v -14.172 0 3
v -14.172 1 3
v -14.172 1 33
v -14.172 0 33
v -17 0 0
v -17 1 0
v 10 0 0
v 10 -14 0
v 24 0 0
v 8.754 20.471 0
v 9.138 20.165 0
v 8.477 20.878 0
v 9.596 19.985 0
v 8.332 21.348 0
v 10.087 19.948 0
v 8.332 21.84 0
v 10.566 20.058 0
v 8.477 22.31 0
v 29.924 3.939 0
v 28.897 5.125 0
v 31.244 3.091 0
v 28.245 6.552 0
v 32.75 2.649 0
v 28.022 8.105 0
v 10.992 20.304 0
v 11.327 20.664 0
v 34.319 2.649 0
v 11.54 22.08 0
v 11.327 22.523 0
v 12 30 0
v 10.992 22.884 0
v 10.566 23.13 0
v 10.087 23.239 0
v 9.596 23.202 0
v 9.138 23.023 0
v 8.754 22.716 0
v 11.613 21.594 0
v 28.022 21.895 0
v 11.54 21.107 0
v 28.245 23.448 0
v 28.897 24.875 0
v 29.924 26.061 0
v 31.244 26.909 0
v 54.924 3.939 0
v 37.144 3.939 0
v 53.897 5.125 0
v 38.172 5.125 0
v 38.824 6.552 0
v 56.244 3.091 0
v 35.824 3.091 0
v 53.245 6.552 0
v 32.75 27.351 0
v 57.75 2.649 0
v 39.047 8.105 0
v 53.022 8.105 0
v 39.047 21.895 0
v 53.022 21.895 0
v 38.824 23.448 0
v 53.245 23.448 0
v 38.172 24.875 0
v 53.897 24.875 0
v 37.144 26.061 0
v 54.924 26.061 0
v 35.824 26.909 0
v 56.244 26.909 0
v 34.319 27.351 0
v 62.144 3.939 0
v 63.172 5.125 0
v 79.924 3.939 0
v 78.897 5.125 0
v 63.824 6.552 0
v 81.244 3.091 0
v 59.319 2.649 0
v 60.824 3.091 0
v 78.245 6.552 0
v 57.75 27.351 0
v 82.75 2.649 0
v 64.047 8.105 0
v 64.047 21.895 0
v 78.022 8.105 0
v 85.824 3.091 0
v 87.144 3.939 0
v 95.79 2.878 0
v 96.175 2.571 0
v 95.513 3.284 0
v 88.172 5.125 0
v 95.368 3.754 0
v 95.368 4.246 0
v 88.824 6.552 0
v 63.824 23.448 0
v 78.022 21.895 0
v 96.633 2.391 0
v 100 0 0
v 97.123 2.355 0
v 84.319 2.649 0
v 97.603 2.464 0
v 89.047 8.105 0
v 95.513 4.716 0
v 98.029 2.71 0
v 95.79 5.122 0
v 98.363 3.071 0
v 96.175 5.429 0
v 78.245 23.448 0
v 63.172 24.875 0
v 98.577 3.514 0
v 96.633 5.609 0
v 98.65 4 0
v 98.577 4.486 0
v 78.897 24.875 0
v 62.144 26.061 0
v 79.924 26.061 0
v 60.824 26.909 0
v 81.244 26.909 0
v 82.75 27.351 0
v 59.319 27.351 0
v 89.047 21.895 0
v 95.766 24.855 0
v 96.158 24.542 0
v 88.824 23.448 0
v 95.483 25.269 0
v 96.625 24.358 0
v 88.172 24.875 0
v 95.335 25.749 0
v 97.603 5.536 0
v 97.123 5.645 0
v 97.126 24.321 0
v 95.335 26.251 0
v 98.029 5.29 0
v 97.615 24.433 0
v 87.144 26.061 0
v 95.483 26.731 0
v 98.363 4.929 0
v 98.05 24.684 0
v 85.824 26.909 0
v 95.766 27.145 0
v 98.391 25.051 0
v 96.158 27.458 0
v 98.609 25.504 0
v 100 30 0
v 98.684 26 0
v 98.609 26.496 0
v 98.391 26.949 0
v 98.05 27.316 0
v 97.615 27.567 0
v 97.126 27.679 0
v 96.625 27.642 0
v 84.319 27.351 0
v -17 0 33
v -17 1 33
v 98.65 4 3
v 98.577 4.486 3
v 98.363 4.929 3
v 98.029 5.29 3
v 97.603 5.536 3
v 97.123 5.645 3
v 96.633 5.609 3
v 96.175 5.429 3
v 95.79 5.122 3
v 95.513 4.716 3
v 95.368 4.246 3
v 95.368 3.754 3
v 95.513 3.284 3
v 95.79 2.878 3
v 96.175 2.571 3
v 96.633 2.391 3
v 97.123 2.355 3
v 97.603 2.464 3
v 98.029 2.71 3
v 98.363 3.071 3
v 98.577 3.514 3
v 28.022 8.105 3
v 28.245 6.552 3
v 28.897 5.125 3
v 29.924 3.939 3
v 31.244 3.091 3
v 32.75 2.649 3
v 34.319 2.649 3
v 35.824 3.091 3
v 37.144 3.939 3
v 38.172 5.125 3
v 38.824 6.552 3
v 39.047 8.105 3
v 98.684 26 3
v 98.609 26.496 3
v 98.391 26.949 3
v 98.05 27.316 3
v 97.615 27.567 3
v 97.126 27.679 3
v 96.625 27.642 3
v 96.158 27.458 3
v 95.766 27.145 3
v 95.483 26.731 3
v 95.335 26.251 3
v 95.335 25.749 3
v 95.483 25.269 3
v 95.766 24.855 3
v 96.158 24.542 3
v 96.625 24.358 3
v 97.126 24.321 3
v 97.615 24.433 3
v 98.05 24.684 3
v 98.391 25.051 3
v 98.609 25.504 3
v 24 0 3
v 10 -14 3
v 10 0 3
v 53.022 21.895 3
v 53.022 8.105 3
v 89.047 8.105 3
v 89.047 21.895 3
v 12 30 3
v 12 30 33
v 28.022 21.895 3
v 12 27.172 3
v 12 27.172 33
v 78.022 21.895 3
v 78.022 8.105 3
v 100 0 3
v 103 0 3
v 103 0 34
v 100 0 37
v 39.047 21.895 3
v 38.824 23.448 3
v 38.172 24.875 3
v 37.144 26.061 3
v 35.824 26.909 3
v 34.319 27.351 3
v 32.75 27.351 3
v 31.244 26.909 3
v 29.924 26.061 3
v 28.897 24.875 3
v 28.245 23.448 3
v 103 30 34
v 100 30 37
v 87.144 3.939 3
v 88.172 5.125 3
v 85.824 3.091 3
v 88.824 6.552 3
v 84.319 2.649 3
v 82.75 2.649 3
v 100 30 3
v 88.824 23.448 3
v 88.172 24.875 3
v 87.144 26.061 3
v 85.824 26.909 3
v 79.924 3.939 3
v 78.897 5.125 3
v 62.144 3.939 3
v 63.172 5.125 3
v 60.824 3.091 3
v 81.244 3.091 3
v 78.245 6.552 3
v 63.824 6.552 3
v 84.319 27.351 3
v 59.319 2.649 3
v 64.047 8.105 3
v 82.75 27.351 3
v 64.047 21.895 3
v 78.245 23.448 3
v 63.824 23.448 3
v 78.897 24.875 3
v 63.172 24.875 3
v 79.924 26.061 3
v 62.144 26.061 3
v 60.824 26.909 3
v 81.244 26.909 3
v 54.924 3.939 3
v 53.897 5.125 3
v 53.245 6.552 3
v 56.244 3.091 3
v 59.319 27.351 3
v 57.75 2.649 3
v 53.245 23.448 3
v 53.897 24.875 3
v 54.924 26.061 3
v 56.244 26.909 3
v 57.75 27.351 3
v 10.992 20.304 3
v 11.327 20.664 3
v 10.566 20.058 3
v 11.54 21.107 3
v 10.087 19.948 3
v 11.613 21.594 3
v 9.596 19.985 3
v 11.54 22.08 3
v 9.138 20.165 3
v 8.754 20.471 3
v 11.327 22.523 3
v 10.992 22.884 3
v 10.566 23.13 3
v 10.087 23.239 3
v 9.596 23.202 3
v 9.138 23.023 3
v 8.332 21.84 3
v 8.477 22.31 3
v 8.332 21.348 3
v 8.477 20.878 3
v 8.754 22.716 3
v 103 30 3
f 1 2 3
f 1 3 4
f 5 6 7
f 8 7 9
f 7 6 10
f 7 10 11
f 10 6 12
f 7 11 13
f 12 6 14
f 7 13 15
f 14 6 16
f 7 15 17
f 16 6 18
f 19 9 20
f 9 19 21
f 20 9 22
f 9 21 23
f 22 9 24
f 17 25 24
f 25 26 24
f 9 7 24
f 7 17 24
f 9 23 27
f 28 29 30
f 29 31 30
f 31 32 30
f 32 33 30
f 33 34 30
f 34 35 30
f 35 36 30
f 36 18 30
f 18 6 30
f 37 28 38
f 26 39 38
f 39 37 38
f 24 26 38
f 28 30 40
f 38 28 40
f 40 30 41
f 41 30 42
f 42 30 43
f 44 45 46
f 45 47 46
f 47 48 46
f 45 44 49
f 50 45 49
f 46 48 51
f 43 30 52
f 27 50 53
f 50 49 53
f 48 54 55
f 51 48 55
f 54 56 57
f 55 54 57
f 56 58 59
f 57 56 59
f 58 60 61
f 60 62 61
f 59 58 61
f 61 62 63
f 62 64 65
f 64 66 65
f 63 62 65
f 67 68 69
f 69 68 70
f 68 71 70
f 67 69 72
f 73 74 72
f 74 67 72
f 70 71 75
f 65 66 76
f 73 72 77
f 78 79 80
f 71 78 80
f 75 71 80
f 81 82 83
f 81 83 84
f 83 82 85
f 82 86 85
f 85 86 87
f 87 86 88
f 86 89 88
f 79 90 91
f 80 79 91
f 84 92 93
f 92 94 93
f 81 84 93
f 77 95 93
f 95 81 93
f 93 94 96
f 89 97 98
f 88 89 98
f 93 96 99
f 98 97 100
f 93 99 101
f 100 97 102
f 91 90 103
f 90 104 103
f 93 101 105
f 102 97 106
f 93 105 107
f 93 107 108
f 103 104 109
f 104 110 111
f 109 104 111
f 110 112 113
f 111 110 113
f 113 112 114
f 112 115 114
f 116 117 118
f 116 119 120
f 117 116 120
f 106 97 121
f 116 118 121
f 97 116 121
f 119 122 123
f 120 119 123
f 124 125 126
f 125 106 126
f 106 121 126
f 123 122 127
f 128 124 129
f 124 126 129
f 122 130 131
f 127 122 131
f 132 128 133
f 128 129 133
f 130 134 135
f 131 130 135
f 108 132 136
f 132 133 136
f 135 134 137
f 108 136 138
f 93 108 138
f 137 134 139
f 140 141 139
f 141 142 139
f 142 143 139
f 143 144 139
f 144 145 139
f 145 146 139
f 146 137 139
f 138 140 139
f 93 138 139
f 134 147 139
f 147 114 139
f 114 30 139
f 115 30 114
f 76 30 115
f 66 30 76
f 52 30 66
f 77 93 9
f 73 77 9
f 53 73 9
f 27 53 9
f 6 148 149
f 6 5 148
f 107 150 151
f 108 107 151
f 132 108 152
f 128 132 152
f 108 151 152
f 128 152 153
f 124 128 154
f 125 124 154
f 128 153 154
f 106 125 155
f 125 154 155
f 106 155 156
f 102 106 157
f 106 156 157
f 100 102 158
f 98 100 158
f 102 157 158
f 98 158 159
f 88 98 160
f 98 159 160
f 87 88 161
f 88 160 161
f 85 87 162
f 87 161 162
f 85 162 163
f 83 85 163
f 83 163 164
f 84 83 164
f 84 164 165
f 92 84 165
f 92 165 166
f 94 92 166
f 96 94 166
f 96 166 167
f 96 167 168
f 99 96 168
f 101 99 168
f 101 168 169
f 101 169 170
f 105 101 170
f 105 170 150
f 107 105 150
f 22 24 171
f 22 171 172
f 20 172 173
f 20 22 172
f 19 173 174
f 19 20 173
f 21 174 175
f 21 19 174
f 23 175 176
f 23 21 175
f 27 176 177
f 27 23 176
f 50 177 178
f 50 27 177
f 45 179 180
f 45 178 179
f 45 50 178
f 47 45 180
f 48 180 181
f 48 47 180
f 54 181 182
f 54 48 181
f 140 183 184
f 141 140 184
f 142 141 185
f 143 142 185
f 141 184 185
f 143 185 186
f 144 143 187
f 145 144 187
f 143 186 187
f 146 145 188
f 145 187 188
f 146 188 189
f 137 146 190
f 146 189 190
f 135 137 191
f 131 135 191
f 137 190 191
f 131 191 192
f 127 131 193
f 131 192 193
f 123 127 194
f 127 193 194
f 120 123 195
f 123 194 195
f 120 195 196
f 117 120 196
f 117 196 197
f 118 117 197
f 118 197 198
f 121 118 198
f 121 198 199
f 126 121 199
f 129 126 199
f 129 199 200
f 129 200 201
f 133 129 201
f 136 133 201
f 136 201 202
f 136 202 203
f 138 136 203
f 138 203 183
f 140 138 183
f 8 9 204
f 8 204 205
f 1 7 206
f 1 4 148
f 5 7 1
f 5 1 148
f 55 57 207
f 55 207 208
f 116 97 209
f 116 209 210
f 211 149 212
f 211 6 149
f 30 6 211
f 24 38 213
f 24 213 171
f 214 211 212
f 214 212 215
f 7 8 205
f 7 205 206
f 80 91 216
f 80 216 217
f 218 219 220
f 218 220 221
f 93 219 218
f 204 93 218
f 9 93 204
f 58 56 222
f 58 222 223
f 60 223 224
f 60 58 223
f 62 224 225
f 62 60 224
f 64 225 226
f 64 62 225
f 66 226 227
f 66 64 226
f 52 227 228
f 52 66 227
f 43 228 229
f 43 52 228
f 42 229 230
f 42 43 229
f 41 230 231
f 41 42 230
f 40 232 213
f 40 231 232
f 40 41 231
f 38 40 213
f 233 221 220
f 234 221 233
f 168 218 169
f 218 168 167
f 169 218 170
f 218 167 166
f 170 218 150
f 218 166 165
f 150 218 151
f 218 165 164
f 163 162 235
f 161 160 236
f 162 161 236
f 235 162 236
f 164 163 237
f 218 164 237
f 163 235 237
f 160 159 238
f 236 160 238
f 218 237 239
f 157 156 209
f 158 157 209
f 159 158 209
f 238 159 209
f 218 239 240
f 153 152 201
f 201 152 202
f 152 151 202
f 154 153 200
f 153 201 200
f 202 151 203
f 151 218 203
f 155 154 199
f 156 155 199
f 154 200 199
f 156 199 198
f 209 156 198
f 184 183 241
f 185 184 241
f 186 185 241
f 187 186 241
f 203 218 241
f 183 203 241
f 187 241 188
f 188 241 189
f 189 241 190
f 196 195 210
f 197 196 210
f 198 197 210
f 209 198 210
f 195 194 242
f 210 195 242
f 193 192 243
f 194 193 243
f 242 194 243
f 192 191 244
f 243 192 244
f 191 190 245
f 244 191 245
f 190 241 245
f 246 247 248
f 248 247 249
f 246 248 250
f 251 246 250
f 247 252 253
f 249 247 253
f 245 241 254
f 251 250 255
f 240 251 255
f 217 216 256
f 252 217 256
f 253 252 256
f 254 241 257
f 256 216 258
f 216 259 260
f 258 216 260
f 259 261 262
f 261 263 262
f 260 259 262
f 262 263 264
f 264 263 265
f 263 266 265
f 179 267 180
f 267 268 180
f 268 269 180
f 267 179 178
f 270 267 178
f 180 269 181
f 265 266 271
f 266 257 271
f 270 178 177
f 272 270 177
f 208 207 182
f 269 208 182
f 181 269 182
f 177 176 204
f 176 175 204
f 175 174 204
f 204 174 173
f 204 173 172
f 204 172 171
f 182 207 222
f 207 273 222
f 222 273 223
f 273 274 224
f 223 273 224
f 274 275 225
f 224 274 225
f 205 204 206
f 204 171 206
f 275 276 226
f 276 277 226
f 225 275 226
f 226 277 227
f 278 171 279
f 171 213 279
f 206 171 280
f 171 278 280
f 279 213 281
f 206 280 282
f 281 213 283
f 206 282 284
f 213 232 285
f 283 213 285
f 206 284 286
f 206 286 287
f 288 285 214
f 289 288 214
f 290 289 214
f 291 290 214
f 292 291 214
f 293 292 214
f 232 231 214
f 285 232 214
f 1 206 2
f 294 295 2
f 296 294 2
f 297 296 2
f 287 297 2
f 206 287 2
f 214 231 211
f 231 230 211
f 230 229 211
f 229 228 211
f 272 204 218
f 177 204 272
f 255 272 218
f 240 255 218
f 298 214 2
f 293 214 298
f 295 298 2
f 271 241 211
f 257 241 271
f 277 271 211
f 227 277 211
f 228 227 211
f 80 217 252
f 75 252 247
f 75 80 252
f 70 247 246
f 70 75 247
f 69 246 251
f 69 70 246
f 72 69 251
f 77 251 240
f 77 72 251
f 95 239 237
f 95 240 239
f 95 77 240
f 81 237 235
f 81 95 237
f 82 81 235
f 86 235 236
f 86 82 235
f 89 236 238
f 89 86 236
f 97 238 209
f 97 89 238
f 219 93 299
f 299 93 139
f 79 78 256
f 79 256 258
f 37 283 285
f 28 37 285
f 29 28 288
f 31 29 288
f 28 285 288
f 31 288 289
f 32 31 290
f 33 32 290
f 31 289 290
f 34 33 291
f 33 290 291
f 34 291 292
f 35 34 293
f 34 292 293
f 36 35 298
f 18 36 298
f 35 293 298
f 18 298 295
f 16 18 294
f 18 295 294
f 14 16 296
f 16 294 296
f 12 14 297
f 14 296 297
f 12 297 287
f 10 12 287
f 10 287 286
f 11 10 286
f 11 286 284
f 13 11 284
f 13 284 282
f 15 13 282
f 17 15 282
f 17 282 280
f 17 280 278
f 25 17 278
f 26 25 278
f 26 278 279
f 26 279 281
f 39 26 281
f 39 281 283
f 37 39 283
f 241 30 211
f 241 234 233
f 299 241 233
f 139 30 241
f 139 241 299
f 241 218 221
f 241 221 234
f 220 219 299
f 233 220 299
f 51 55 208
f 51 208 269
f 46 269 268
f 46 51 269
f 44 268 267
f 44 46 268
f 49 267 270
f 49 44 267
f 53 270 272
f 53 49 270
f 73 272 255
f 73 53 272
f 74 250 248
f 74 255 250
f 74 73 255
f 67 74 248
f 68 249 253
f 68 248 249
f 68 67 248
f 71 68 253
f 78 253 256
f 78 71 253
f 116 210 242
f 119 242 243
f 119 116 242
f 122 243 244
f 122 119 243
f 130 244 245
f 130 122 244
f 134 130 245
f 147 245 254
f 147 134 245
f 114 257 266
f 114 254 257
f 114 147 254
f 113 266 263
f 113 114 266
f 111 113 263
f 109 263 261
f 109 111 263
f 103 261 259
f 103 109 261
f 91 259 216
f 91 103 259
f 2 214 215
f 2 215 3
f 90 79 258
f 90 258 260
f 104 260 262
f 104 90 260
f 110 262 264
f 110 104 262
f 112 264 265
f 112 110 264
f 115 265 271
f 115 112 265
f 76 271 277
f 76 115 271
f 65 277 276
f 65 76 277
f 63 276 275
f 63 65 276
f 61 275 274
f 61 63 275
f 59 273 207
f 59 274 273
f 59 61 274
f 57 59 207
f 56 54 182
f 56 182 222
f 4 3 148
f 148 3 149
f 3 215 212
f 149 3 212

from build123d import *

# Parameters (mm, degrees)
SKETCH_1_W           = 100
SKETCH_1_H           = 30
EXTRUDE_1_DEPTH      = 3
CUT_EXTRUDE_1_REACH  = 106.446
EXTRUDE_3_DEPTH      = 3
CUT_EXTRUDE_2_REACH  = 106.446
SKETCH_5_R           = 1.65
SKETCH_5_R_2         = 1.683787266
EXTRUDE_4_DEPTH      = 34
EXTRUDE_4_DEPTH_BACK = 3
SKETCH_6_W           = 3
SKETCH_6_H           = 30
EXTRUDE_5_DEPTH      = 30
CHAMFER_1_SIZE       = 3
CHAMFER_2_SIZE       = 3
EXTRUDE_6_DEPTH      = 3
CUT_EXTRUDE_3_DEPTH  = 114.481275989


with BuildPart() as part:
    # 草图1 → 凸台-拉伸1 (new body)
    with BuildSketch(Plane.XY):
        with Locations((50, 15)):
            Rectangle(SKETCH_1_W, SKETCH_1_H)
    extrude(amount=EXTRUDE_1_DEPTH)

    # 草图2 → 切除-拉伸1 (cut, up to next)
    with BuildSketch(Plane.XY.offset(3), mode=Mode.PRIVATE) as cut_extrude_1_sk1:
        Polygon((0, 18), (12, 30), (0, 30), align=None)
    cut_extrude_1_tool1 = extrude(cut_extrude_1_sk1.sketch, amount=-CUT_EXTRUDE_1_REACH, mode=Mode.PRIVATE) & part.part
    add(cut_extrude_1_tool1.solids().sort_by_distance((4, 26, 3))[0], mode=Mode.SUBTRACT)

    # 草图4 → 凸台-拉伸3 (add)
    with BuildSketch(Plane(origin=(0, 0, 0), x_dir=(-1, 0, 0), z_dir=(0, 0, -1))):
        Polygon((0, 0), (17, 0), (17, 1), (0, 18), align=None)
    extrude(amount=-EXTRUDE_3_DEPTH)

    # 草图5 → 切除-拉伸2 (cut, up to next)
    with BuildSketch(Plane.XY.offset(3), mode=Mode.PRIVATE) as cut_extrude_2_sk1:
        with Locations((9.963410089, 21.593670707)):
            Circle(SKETCH_5_R)
    cut_extrude_2_tool1 = extrude(cut_extrude_2_sk1.sketch, amount=-CUT_EXTRUDE_2_REACH, mode=Mode.PRIVATE) & part.part
    # 草图5 → 切除-拉伸2 (cut, up to next)
    with BuildSketch(Plane.XY.offset(3), mode=Mode.PRIVATE) as cut_extrude_2_sk2:
        with Locations((97, 26)):
            Circle(SKETCH_5_R_2)
    cut_extrude_2_tool2 = extrude(cut_extrude_2_sk2.sketch, amount=-CUT_EXTRUDE_2_REACH, mode=Mode.PRIVATE) & part.part
    # 草图5 → 切除-拉伸2 (cut, up to next)
    with BuildSketch(Plane.XY.offset(3), mode=Mode.PRIVATE) as cut_extrude_2_sk3:
        with Locations((97, 4)):
            Circle(SKETCH_5_R)
    cut_extrude_2_tool3 = extrude(cut_extrude_2_sk3.sketch, amount=-CUT_EXTRUDE_2_REACH, mode=Mode.PRIVATE) & part.part
    add(cut_extrude_2_tool1.solids().sort_by_distance((9.96341, 21.593671, 3))[0], mode=Mode.SUBTRACT)
    add(cut_extrude_2_tool2.solids().sort_by_distance((97, 26, 3))[0], mode=Mode.SUBTRACT)
    add(cut_extrude_2_tool3.solids().sort_by_distance((97, 4, 3))[0], mode=Mode.SUBTRACT)

    # 草图6 → 凸台-拉伸4 (add, two sides: drawn at the far end of the back side and taken through both)
    with BuildSketch(Plane.XY.offset(3).offset(-EXTRUDE_4_DEPTH_BACK)):
        with Locations((101.5, 15)):
            Rectangle(SKETCH_6_W, SKETCH_6_H)
    extrude(amount=EXTRUDE_4_DEPTH + EXTRUDE_4_DEPTH_BACK)

    # 草图7 → 凸台-拉伸5 (add)
    with BuildSketch(Plane.XY.offset(3)):
        Polygon((-17, 1), (12, 30), (12, 27.171572875), (-14.171572875, 1), (-14.171572875, 0), (-17, 0), align=None)
    extrude(amount=EXTRUDE_5_DEPTH)

    # 倒角1
    chamfer_1_edges = [part.edges().sort_by_distance(p)[0] for p in [
        (103, 15, 0),
    ]]
    chamfer(chamfer_1_edges, length=CHAMFER_1_SIZE)

    # 倒角2
    chamfer_2_edges = [part.edges().sort_by_distance(p)[0] for p in [
        (103, 15, 37),
    ]]
    chamfer(chamfer_2_edges, length=CHAMFER_2_SIZE - 0.0001)  # a hair under: the kernel refuses the full size

    # 草图3 → 凸台-拉伸6 (add)
    with BuildSketch(Plane(origin=(0, 0, 0), x_dir=(-1, 0, 0), z_dir=(0, 0, -1))):
        Polygon((-24, 0), (-10, -14), (-10, 0), align=None)
    extrude(amount=-EXTRUDE_6_DEPTH)

    # 草图8 → 切除-拉伸3 (cut, through all)
    with BuildSketch(Plane(origin=(0, 0, 0), x_dir=(-1, 0, 0), z_dir=(0, 0, -1))):
        with BuildLine():
            Line((-78.021683781, 21.894650921), (-78.021683781, 8.105349079))
            ThreePointArc((-78.021683781, 8.105349079), (-83.534405897, 2.592626964), (-89.047128012, 8.105349079))
            Line((-89.047128012, 8.105349079), (-89.047128012, 21.894650921))
            ThreePointArc((-89.047128012, 21.894650921), (-83.534405897, 27.407373036), (-78.021683781, 21.894650921))
        make_face()
        with BuildLine():
            Line((-53.021683781, 21.894650921), (-53.021683781, 8.105349079))
            ThreePointArc((-53.021683781, 8.105349079), (-58.534405897, 2.592626964), (-64.047128012, 8.105349079))
            Line((-64.047128012, 8.105349079), (-64.047128012, 21.894650921))
            ThreePointArc((-64.047128012, 21.894650921), (-58.534405897, 27.407373036), (-53.021683781, 21.894650921))
        make_face()
        with BuildLine():
            Line((-28.021683781, 21.894650921), (-28.021683781, 8.105349079))
            ThreePointArc((-28.021683781, 8.105349079), (-33.534405897, 2.592626964), (-39.047128012, 8.105349079))
            Line((-39.047128012, 8.105349079), (-39.047128012, 21.894650921))
            ThreePointArc((-39.047128012, 21.894650921), (-33.534405897, 27.407373036), (-28.021683781, 21.894650921))
        make_face()
    extrude(amount=-CUT_EXTRUDE_3_DEPTH, mode=Mode.SUBTRACT)


solid = part.part
